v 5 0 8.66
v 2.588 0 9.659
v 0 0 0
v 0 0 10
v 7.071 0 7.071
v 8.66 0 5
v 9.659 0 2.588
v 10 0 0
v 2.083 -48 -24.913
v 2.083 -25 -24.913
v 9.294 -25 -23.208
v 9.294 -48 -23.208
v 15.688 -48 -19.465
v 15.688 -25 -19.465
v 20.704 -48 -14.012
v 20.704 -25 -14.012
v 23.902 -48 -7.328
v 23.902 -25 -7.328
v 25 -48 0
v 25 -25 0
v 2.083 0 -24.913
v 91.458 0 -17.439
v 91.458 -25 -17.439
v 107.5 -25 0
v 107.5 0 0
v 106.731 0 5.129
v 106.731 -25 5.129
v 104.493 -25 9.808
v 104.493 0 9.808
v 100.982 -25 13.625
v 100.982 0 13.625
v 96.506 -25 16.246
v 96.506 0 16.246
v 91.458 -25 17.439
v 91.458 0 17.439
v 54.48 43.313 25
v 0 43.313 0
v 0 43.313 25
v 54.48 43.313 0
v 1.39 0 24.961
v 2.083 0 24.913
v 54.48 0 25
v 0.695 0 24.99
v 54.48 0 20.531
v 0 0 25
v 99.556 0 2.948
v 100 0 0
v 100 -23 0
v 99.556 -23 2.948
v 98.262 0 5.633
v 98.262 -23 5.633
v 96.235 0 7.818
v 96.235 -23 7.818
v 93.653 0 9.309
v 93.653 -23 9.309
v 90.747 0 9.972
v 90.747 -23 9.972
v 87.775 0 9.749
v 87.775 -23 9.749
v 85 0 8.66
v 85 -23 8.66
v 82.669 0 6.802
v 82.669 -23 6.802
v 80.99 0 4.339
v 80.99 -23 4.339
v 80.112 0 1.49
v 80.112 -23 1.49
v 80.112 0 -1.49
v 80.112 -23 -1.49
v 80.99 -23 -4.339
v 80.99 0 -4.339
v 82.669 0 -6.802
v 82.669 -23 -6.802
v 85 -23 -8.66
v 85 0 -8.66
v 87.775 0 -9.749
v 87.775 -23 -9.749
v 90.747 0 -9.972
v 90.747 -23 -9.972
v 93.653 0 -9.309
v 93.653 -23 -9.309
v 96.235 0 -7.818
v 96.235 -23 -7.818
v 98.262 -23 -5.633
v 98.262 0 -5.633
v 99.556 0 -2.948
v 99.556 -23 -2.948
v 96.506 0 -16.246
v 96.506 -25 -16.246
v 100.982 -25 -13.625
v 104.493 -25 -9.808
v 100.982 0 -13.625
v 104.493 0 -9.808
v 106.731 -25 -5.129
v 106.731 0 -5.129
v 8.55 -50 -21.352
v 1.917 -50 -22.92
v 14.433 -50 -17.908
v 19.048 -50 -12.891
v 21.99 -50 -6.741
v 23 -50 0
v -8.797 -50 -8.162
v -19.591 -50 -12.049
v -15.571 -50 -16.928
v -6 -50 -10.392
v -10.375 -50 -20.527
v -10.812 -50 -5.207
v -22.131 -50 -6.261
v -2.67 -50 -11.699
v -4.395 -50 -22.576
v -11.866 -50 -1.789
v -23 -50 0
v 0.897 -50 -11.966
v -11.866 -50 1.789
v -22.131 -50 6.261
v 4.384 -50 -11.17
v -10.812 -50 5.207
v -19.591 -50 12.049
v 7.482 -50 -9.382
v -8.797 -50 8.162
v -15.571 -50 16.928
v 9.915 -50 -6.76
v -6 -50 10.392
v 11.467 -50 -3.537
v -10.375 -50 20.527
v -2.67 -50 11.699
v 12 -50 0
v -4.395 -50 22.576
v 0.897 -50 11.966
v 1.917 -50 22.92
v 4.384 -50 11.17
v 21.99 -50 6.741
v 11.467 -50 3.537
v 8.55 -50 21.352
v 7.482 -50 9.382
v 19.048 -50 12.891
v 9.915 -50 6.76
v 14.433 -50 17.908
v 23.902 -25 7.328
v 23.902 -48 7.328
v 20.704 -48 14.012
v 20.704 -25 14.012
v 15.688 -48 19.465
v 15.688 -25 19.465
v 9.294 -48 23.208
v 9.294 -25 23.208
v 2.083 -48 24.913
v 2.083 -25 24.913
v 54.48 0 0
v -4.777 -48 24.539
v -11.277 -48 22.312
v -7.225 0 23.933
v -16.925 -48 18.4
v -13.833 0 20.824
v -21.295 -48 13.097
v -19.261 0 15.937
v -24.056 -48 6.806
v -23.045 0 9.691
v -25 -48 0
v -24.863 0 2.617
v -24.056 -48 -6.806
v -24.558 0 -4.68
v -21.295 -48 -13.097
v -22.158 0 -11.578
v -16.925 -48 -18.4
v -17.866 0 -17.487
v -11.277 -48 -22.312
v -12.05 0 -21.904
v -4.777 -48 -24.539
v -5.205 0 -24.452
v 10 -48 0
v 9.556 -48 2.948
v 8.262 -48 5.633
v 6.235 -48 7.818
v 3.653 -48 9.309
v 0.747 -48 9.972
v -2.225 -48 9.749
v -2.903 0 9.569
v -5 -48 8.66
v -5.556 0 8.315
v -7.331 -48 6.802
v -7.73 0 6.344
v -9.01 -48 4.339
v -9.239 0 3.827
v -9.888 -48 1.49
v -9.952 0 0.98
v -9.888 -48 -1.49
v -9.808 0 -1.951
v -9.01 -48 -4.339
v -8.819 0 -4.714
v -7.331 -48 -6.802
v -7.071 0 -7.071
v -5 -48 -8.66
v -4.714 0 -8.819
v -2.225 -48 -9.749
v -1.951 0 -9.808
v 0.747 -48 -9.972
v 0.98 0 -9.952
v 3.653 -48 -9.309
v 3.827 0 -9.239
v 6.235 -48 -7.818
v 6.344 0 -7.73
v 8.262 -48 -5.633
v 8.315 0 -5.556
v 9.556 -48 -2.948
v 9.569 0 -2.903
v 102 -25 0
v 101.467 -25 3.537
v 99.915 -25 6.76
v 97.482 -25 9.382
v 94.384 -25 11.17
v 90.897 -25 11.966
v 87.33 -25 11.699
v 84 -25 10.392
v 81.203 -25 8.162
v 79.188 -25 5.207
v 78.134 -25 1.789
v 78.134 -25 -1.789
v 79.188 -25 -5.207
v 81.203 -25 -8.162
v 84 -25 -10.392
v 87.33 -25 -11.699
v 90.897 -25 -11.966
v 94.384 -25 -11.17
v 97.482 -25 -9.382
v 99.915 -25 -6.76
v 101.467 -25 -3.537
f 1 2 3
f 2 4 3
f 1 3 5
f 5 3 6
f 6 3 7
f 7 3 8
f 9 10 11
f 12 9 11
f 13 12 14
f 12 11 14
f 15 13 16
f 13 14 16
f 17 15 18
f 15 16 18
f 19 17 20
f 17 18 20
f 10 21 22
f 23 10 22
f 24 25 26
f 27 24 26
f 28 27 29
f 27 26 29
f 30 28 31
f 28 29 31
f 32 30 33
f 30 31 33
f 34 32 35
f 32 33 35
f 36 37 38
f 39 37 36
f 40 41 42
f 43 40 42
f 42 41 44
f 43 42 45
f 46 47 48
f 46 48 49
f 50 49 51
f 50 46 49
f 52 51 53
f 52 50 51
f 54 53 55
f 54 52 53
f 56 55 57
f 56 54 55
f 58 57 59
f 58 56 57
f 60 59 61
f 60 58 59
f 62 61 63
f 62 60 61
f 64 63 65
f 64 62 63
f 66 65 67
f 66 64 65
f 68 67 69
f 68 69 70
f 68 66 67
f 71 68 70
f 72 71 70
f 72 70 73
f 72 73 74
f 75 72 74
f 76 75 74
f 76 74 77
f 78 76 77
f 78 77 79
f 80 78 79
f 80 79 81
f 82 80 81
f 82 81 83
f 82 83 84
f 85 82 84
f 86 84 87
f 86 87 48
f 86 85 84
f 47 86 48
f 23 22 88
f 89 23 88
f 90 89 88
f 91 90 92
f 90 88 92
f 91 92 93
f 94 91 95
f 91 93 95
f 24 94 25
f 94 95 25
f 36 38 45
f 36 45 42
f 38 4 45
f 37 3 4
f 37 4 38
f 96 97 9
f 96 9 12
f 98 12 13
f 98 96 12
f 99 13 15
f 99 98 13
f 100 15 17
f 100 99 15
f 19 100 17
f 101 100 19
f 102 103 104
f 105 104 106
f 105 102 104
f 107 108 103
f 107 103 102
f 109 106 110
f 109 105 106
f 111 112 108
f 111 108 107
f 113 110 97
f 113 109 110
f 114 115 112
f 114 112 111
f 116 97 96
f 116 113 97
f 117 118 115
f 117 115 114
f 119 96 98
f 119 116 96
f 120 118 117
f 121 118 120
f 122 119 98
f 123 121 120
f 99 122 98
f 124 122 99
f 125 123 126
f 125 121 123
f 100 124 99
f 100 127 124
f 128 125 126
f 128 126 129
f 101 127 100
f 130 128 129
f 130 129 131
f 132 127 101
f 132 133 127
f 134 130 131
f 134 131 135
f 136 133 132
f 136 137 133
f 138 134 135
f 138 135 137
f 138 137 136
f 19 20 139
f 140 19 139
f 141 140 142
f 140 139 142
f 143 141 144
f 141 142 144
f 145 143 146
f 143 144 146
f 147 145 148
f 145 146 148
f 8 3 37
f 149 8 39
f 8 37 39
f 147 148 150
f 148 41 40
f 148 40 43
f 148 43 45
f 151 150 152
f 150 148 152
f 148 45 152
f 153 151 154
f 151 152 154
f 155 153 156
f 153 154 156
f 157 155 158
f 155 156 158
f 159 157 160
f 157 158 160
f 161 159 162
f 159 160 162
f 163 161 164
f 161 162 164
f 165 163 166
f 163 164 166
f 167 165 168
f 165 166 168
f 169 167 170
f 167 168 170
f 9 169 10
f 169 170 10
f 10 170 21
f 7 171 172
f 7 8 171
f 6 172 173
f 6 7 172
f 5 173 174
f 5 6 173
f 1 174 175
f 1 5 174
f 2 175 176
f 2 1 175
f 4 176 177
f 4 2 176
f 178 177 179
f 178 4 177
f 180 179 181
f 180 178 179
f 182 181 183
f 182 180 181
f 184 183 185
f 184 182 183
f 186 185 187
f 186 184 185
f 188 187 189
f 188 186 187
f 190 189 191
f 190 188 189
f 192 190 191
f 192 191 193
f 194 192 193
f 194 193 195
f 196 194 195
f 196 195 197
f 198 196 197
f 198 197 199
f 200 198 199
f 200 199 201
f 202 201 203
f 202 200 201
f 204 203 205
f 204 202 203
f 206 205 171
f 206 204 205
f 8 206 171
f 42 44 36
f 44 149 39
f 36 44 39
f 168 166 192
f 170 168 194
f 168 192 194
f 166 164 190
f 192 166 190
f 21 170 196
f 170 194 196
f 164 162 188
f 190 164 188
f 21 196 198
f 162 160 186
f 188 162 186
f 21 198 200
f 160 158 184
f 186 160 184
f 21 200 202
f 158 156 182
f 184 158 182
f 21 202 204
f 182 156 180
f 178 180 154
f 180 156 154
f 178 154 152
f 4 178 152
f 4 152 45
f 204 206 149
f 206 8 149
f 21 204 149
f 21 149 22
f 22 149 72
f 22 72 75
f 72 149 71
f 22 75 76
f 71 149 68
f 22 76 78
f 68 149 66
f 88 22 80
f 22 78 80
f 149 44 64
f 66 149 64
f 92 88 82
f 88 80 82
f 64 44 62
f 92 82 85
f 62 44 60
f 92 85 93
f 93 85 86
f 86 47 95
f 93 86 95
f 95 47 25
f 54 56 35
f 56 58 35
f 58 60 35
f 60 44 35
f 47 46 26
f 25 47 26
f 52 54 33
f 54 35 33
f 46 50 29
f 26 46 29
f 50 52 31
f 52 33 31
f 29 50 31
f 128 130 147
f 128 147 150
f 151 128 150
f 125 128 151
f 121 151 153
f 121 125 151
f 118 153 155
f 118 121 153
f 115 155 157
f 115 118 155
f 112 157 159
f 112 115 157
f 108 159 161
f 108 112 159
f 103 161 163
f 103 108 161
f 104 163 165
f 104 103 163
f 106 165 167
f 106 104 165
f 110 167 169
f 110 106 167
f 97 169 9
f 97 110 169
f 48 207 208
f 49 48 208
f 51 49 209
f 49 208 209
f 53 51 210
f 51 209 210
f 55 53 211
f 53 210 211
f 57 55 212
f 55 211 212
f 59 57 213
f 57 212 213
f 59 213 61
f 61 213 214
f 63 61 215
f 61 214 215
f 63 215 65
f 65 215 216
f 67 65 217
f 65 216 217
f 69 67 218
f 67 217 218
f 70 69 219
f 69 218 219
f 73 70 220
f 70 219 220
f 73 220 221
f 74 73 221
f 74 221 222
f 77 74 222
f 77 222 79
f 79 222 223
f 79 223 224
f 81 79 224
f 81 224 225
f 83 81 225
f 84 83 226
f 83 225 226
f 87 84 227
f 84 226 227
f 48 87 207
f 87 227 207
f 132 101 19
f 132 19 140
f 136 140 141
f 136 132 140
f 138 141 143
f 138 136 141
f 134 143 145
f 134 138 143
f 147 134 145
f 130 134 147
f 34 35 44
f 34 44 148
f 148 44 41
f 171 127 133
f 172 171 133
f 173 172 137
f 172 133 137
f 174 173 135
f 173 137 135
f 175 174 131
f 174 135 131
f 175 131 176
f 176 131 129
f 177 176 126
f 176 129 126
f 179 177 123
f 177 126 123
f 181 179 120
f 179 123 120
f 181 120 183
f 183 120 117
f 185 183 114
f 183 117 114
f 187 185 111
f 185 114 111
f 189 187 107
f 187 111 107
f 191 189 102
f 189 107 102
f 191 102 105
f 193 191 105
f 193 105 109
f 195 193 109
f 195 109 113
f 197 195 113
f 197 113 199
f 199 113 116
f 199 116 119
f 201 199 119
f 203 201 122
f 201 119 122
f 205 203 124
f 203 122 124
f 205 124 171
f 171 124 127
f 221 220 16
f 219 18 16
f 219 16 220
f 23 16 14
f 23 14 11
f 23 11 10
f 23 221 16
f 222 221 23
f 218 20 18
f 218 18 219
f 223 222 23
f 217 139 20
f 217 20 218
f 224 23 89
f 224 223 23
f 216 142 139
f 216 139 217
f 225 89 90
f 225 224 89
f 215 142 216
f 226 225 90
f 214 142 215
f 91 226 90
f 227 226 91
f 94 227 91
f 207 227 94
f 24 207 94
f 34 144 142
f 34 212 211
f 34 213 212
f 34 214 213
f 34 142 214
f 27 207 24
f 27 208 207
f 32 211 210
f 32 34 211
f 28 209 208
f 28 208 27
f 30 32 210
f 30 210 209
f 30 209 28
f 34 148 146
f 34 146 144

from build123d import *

# Parameters (mm, degrees)
F0_R     = 10
F1_DEPTH = 25
F2_DEPTH = 50
F3_SIZE  = 2
F4_W     = 54.479554
F4_H     = 43.313496
F5_DEPTH = 25


with BuildPart() as f1:
    # F0 (on Front) → F1 (new body)
    with BuildSketch(Plane.XZ):
        with BuildLine():
            ThreePointArc((2.083333, -24.913043), (18.399502, -16.92508), (25, 0))
            ThreePointArc((25, 0), (18.399502, 16.92508), (2.083333, 24.913043))
            ThreePointArc((2.083333, 24.913043), (-25, 0), (2.083333, -24.913043))
        make_face()
        Circle(F0_R, mode=Mode.SUBTRACT)
        with BuildLine():
            ThreePointArc((2.083333, 24.913043), (18.399502, 16.92508), (25, 0))
            ThreePointArc((25, 0), (18.399502, -16.92508), (2.083333, -24.913043))
            Line((2.083333, -24.913043), (91.458333, -17.43913))
            ThreePointArc((91.458333, -17.43913), (72.5, 0), (91.458333, 17.43913))
            Line((91.458333, 17.43913), (2.083333, 24.913043))
        make_face()
        with BuildLine():
            ThreePointArc((107.5, 0), (102.879651, 11.847556), (91.458333, 17.43913))
            ThreePointArc((91.458333, 17.43913), (72.5, 0), (91.458333, -17.43913))
            ThreePointArc((91.458333, -17.43913), (102.879651, -11.847556), (107.5, 0))
        make_face()
        with Locations((90, 0)):
            Circle(F0_R, mode=Mode.SUBTRACT)
    extrude(amount=F1_DEPTH)

    # F0 (on Front) → F2 (join)
    with BuildSketch(Plane.XZ):
        with BuildLine():
            ThreePointArc((2.083333, -24.913043), (18.399502, -16.92508), (25, 0))
            ThreePointArc((25, 0), (18.399502, 16.92508), (2.083333, 24.913043))
            ThreePointArc((2.083333, 24.913043), (-25, 0), (2.083333, -24.913043))
        make_face()
        Circle(F0_R, mode=Mode.SUBTRACT)
    extrude(amount=F2_DEPTH)

    # F3
    f3_edges = [f1.edges().sort_by_distance(p)[0] for p in [
        (-2.083333, -50, 24.913043),
        (-10, -50, 0),
        (80, -25, 0),
    ]]
    chamfer(f3_edges, length=F3_SIZE)

    # F4 (on Top) → F5 (join)
    with BuildSketch(Plane.XY):
        with Locations((27.239777, 21.656748)):
            Rectangle(F4_W, F4_H)
    extrude(amount=F5_DEPTH)


solid = f1.part
